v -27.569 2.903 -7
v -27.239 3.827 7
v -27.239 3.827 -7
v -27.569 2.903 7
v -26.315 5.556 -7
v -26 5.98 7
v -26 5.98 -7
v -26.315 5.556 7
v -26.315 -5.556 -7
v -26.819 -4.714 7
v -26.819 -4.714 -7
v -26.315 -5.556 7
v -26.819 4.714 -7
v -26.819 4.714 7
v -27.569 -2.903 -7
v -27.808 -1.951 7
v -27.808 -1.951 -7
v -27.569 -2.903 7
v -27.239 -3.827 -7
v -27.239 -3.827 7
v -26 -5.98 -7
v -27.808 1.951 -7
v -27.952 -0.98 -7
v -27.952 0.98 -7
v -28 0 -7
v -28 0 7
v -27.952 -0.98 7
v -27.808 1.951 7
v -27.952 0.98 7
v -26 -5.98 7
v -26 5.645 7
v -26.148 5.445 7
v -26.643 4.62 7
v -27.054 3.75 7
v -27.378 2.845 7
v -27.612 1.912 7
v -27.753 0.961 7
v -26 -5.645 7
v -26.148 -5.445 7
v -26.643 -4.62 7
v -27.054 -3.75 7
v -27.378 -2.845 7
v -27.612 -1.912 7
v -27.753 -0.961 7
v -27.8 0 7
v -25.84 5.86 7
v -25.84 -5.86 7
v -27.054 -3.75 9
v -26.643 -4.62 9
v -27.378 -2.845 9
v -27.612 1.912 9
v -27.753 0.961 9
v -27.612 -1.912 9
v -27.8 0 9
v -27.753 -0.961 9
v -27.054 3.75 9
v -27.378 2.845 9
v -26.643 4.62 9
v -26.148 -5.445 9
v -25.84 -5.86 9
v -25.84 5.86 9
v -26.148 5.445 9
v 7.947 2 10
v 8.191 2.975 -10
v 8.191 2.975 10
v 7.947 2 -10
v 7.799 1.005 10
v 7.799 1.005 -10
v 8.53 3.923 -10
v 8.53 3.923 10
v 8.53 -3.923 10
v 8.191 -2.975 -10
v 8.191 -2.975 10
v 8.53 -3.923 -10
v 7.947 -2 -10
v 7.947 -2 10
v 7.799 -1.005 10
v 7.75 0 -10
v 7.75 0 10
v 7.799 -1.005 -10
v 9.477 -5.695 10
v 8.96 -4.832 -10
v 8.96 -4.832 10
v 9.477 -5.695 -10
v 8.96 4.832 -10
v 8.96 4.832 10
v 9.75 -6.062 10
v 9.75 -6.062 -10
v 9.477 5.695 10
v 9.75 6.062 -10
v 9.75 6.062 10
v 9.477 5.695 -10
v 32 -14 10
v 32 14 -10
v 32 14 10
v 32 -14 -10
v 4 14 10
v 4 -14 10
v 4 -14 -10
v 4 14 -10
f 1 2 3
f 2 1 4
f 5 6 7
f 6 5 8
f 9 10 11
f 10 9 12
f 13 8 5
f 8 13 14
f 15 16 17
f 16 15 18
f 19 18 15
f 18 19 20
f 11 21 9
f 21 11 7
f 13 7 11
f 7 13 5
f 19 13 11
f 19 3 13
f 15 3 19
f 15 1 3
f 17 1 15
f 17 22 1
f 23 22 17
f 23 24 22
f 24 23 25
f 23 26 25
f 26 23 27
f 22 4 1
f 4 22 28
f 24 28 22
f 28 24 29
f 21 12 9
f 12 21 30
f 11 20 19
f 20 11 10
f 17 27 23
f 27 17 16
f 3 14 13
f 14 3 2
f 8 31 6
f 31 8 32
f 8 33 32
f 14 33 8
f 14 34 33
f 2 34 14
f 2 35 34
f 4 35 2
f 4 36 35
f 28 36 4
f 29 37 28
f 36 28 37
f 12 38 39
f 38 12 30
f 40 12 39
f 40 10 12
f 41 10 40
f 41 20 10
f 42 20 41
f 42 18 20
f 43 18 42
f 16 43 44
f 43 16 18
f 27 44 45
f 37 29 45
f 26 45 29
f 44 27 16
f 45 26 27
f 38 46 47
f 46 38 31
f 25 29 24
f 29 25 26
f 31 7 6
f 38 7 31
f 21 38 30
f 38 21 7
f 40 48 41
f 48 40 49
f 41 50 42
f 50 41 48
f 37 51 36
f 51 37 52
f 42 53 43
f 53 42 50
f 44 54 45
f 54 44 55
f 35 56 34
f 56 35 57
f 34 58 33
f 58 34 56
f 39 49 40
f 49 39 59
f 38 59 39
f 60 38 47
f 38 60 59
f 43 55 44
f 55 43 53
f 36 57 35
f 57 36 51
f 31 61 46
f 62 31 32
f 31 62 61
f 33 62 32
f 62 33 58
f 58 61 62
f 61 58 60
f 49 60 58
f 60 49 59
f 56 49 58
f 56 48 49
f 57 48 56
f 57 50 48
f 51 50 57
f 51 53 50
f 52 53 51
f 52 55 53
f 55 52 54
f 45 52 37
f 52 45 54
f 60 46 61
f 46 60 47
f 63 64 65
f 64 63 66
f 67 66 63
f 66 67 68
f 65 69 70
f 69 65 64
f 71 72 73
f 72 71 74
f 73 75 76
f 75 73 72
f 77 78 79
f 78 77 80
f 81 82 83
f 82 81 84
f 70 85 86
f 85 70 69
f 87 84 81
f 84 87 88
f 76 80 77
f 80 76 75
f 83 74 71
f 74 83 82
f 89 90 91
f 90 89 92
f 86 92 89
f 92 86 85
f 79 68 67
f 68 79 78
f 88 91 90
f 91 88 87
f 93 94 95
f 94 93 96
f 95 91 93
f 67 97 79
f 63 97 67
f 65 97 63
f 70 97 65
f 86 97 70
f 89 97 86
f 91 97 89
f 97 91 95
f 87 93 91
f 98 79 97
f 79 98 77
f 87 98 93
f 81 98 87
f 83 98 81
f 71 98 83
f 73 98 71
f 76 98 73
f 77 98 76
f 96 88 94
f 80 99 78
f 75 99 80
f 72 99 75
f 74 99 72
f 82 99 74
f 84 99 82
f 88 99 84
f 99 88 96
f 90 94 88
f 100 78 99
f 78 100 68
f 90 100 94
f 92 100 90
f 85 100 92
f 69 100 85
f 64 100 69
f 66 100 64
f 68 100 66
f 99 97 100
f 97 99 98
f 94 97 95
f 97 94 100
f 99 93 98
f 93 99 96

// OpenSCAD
$fn=64;

module d_profile(r=10, depth=8, h=10){
    // D shape: circle clipped by a flat
    difference(){
        cylinder(h=h, r=r, center=true);
        translate([r-depth,0,0])
            cube([2*r, 2*r+2, h+2], center=true);
    }
}

module d_connector(male=true, r=10, depth=8, h=12, clearance=0.25, lead=2){
    if(male){
        union(){
            d_profile(r=r, depth=depth, h=h);
            translate([0,0,h/2 + lead/2])
                d_profile(r=r*0.98, depth=depth*0.98, h=lead);
        }
    } else {
        difference(){
            translate([0,0,0])
                cube([2*(r+4), 2*(r+4), h+6], center=true);
            translate([0,0,0])
                d_profile(r=r+clearance, depth=depth+clearance, h=h+8);
        }
    }
}

module demo(){
    union(){
        translate([-18,0,0]) d_connector(male=true, r=10, depth=8, h=14, clearance=0.25, lead=2);
        translate([18,0,0]) d_connector(male=false, r=10, depth=8, h=14, clearance=0.25, lead=2);
    }
}

demo();
